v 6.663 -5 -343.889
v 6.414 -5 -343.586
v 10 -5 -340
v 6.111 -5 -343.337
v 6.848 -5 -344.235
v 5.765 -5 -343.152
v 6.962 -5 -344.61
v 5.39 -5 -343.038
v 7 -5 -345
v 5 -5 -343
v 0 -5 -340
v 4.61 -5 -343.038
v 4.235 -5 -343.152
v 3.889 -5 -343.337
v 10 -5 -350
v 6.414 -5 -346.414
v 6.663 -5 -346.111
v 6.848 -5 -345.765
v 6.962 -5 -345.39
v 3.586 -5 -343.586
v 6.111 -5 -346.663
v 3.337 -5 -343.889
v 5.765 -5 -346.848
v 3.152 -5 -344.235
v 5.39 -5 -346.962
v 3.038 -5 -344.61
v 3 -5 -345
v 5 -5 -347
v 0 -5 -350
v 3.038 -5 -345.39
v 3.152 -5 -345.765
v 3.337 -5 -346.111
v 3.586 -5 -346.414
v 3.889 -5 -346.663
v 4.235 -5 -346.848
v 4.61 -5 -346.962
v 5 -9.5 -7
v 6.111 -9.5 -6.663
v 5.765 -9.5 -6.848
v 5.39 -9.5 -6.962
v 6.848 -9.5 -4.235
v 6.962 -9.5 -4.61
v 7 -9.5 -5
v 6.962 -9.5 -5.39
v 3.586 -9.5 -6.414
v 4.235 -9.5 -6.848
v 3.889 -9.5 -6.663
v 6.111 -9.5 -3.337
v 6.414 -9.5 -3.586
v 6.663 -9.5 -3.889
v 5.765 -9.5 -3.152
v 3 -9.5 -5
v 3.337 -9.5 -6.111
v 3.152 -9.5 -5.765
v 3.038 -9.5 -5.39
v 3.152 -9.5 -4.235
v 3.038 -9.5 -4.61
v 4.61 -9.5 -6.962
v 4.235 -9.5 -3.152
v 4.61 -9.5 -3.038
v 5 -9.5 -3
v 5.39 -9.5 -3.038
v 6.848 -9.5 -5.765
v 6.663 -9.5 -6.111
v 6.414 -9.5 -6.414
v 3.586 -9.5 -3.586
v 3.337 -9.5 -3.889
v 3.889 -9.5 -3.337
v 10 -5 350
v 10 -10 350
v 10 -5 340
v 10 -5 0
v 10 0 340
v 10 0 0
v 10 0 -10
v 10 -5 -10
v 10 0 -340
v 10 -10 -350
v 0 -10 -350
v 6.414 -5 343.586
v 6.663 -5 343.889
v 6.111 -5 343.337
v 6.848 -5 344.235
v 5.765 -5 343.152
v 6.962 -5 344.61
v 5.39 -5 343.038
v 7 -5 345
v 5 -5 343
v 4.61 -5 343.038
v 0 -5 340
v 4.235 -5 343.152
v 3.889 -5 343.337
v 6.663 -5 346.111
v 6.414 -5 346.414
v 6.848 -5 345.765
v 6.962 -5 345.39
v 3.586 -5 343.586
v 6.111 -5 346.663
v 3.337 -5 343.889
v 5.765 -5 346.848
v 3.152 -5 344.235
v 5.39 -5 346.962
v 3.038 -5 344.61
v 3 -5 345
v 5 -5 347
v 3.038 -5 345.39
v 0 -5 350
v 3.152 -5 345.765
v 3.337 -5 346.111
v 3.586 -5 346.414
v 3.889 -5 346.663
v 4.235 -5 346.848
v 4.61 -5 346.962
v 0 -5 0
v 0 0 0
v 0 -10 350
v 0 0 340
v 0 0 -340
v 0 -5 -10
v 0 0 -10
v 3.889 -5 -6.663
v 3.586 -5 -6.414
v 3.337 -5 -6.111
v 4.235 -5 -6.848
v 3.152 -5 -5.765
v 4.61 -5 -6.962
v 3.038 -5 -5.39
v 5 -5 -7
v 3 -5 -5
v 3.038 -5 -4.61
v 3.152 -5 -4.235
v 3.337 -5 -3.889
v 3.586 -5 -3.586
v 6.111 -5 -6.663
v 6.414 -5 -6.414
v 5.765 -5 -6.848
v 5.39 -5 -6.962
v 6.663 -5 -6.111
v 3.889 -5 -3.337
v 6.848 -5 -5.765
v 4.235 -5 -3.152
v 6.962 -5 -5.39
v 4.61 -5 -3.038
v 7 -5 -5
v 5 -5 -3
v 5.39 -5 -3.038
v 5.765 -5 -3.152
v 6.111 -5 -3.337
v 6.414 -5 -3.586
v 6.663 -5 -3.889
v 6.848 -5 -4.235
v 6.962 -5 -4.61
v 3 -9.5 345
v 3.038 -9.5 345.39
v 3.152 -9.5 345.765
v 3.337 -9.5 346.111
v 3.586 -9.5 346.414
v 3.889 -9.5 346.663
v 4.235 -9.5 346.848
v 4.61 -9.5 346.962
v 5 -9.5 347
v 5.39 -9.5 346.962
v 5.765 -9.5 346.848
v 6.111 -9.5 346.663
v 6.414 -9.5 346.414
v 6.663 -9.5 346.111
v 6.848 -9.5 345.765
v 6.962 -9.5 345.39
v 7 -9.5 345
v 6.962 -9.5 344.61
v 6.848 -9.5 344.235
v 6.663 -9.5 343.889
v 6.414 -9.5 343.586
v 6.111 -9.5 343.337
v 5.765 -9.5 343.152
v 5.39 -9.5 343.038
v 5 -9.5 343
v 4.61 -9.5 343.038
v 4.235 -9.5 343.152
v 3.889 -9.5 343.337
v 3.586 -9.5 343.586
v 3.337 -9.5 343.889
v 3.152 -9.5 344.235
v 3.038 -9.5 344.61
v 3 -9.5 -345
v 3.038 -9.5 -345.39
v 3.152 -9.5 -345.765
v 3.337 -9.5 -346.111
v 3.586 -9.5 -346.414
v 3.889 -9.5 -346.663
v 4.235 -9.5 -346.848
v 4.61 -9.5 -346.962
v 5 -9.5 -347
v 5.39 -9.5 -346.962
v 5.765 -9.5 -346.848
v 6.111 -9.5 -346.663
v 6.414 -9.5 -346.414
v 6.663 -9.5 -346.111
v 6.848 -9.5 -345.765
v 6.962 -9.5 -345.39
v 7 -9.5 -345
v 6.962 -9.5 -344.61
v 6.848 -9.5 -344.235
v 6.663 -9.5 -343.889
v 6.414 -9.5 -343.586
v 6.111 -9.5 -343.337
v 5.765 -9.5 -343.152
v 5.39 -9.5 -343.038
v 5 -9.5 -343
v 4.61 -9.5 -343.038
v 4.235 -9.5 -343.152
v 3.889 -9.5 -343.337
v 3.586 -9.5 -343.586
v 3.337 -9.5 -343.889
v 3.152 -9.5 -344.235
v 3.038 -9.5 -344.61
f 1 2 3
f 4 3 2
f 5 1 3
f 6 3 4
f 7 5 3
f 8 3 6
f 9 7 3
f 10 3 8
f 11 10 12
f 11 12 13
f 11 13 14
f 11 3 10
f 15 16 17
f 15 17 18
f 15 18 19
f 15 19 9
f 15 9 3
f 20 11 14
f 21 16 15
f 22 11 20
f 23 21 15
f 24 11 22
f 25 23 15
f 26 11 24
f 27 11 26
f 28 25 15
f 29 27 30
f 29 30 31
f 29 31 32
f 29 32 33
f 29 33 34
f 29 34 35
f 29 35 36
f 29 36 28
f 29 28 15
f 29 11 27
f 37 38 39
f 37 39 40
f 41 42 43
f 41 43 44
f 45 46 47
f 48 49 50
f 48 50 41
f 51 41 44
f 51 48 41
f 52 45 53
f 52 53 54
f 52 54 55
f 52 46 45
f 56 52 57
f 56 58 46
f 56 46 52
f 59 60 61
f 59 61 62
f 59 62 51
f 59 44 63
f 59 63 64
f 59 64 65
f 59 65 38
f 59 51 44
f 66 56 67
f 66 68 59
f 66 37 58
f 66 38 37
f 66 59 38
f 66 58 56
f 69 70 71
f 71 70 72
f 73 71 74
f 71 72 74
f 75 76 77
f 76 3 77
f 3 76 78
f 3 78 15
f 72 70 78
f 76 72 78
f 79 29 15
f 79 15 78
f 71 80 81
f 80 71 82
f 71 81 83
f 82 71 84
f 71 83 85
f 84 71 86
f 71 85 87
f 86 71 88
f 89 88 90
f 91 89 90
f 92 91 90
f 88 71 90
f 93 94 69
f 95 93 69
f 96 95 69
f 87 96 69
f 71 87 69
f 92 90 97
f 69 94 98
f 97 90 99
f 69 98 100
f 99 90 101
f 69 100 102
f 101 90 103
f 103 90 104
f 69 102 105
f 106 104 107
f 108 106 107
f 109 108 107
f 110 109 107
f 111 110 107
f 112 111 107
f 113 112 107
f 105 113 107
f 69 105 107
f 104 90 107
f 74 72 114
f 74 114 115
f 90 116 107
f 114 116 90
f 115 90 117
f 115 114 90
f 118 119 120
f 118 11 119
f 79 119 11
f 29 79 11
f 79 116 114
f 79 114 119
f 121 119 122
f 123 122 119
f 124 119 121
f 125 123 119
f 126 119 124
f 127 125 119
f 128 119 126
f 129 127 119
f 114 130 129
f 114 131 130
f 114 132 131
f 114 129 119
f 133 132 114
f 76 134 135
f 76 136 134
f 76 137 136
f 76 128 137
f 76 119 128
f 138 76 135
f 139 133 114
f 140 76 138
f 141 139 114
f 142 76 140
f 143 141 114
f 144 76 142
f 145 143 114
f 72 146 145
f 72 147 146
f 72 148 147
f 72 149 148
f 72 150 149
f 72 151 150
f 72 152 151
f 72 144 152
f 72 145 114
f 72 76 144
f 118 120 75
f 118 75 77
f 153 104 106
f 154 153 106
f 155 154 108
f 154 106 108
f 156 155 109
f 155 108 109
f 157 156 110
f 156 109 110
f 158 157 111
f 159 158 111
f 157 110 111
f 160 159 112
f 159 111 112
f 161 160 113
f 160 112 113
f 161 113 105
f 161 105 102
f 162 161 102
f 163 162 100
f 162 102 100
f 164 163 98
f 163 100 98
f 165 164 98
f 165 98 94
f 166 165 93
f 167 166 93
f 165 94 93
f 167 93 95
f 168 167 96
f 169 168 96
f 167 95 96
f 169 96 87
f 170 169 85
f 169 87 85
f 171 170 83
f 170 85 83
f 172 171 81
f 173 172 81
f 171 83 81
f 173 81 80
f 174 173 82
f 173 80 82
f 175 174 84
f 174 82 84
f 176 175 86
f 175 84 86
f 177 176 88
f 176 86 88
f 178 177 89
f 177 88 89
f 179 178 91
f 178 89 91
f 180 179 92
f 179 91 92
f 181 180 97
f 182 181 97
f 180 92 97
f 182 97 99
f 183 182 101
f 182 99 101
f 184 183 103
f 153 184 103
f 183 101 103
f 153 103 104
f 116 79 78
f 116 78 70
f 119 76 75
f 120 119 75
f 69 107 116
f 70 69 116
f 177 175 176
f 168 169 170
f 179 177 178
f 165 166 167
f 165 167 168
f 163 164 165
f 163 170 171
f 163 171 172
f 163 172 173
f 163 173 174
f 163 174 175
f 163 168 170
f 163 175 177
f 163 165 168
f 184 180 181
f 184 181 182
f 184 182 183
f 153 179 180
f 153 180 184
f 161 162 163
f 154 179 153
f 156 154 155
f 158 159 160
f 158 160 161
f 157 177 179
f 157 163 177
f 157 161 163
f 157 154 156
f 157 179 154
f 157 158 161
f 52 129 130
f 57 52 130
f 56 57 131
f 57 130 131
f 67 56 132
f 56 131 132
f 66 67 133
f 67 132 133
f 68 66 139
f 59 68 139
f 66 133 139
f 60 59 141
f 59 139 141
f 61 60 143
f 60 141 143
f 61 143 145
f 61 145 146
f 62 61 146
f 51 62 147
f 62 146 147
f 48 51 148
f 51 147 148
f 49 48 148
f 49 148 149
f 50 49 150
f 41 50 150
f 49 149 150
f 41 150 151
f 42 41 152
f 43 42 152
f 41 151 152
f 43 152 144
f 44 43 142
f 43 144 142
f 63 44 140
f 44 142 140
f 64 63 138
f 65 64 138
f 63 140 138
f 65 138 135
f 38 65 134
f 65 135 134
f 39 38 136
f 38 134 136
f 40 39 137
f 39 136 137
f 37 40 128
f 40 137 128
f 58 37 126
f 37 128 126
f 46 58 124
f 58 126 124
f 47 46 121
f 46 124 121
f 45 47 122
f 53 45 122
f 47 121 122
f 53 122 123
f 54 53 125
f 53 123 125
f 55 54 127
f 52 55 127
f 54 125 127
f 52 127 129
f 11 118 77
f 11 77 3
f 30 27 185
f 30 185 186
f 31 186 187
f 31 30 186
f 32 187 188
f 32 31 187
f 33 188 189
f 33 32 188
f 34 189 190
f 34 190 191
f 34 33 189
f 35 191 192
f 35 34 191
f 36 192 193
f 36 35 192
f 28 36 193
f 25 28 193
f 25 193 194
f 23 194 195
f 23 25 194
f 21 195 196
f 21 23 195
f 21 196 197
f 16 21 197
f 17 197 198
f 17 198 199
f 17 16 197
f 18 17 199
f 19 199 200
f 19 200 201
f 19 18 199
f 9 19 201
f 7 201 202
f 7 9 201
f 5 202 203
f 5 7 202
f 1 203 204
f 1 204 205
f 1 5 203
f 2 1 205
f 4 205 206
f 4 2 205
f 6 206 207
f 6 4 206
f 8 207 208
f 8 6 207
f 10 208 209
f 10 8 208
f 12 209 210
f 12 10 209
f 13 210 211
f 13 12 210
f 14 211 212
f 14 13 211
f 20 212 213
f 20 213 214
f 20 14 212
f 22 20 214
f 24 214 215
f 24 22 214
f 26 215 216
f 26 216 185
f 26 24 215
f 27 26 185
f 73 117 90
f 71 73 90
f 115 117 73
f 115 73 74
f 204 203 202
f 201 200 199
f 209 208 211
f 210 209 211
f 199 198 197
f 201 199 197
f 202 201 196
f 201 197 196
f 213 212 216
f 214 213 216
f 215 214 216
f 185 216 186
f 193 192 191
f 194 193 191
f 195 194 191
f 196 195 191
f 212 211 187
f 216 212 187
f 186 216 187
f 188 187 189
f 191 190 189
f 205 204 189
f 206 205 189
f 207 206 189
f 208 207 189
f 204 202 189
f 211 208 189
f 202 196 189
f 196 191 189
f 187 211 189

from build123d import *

# Parameters (mm, degrees)
F1_DEPTH = 10
F2_R     = 2
F3_DEPTH = 4.5
F5_W     = 5
F5_H     = 10
F6_DEPTH = 10.001
F7_R     = 2
F8_DEPTH = 4.5


with BuildPart() as f1:
    # F0 (on Right) → F1 (new body)
    with BuildSketch(Plane.YZ):
        Polygon((-10, 0), (0, 0), (0, 340), (-5, 340), (-5, 350), (-10, 350), align=None)
    extrude(amount=F1_DEPTH)

    # F2 (on face) → F3 (cut)
    with BuildSketch(Plane(origin=(0, -5, 0), x_dir=(-1, 0, 0), z_dir=(0, 1, 0))):
        with Locations((-5, 345)):
            Circle(F2_R)
    extrude(amount=-F3_DEPTH, mode=Mode.SUBTRACT)

    # F4: F1 across plane


with BuildPart() as f1_1:
    add(f1.part)
    add(f1.part.mirror(Plane.XY))

    # F5 (on face) → F6 (cut, through all)
    with BuildSketch(Plane.YZ.offset(10)):
        with Locations((-2.5, -5)):
            Rectangle(F5_W, F5_H)
    extrude(amount=-F6_DEPTH, mode=Mode.SUBTRACT)

    # F7 (on face) → F8 (cut)
    with BuildSketch(Plane(origin=(0, -5, 0), x_dir=(-1, 0, 0), z_dir=(0, 1, 0))):
        with Locations((-5, -5)):
            Circle(F7_R)
    extrude(amount=-F8_DEPTH, mode=Mode.SUBTRACT)


solid = f1_1.part
